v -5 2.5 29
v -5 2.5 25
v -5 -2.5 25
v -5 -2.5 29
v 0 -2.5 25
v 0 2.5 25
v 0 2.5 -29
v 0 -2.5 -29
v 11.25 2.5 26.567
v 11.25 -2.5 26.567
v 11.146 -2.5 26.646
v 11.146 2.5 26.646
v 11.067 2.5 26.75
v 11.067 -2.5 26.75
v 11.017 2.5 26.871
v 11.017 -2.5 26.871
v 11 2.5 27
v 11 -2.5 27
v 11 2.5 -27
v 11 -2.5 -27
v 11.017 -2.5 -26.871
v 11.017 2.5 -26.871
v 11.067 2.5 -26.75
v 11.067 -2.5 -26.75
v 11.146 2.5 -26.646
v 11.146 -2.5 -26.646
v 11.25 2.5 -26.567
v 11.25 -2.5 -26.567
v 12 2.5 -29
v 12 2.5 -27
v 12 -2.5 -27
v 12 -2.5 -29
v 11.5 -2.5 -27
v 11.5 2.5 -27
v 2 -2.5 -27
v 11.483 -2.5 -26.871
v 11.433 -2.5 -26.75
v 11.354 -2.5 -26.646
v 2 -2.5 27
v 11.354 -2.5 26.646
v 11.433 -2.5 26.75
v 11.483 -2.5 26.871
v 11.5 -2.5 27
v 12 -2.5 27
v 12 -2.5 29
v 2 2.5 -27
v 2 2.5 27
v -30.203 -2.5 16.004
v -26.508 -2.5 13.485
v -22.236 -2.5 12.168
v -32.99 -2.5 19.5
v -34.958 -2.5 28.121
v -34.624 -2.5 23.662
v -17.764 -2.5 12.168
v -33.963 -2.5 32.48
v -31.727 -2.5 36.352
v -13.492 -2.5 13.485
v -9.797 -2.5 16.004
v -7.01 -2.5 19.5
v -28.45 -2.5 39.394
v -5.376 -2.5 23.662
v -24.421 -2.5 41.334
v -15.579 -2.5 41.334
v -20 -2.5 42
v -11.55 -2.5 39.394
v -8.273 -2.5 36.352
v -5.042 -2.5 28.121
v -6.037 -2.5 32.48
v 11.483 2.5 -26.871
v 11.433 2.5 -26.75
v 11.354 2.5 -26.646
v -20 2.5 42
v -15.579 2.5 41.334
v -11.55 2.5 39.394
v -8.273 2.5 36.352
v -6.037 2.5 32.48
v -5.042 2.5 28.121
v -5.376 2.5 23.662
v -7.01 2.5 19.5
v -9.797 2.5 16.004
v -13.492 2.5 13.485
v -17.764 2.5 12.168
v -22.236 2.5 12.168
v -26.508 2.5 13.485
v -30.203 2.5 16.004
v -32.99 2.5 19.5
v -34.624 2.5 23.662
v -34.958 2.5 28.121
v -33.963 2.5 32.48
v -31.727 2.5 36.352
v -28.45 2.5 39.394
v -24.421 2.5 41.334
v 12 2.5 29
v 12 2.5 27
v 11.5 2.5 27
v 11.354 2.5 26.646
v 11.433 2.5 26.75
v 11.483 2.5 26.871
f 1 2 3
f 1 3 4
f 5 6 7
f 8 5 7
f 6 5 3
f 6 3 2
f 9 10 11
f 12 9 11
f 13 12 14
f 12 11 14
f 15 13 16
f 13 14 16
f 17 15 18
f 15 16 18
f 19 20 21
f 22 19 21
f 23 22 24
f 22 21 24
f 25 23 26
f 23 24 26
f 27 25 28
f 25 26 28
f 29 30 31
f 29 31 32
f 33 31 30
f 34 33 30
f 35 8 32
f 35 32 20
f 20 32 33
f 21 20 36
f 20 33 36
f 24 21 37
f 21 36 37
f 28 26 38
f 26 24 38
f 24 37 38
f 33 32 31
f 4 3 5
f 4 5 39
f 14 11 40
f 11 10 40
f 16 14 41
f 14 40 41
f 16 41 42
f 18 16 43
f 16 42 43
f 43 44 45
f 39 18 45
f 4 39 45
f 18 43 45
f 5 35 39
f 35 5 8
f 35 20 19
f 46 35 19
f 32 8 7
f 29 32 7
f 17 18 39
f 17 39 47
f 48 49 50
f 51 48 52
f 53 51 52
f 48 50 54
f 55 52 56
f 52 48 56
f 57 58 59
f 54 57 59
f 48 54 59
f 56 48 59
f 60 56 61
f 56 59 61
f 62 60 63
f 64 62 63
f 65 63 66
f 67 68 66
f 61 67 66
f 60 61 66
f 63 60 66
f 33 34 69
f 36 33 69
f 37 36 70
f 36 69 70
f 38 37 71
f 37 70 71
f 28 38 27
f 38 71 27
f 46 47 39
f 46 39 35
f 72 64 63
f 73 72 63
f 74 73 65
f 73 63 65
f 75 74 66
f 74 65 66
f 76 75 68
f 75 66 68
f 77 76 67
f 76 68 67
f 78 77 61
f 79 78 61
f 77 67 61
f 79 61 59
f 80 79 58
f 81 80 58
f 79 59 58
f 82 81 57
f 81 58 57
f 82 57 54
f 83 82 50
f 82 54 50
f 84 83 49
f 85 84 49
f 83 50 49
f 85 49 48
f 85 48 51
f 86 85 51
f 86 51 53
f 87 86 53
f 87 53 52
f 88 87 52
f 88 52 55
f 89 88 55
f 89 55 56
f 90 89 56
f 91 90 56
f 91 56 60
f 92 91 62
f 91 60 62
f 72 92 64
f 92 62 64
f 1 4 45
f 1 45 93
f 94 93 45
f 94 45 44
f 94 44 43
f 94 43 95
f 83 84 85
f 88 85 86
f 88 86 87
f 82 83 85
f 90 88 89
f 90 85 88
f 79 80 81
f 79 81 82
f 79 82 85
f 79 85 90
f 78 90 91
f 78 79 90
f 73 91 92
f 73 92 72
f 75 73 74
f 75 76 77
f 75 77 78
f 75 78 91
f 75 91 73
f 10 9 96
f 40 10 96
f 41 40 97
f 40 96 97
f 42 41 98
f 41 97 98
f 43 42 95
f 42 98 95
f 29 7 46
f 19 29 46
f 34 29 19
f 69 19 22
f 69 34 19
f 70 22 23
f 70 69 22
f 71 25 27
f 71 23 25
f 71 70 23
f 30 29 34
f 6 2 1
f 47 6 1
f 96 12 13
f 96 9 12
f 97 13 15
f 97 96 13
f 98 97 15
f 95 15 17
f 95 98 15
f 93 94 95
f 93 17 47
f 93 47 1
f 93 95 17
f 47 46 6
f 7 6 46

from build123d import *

# Parameters (mm, degrees)
SKETCH6_W                = 58
SKETCH6_H                = 5
BOSS_EXTRUDE2_DEPTH      = 12
SKETCH7_W                = 54
SKETCH7_H                = 5
CUT_EXTRUDE3_DEPTH       = 10
SKETCH8_W                = 0.5
SKETCH8_H                = 5
BOSS_EXTRUDE3_DEPTH      = 0.5
FILLET1_R                = 0.5
FILLET1_OF_MIRROR3_R     = 0.5
SKETCH9_W                = 4
SKETCH9_H                = 5
BOSS_EXTRUDE4_DEPTH      = 5
BOSS_EXTRUDE5_DEPTH      = 2.5
BOSS_EXTRUDE5_DEPTH_BACK = 2.5
SKETCH11_R               = 15


with BuildPart() as part:
    # Sketch6 → Boss-Extrude2 (new body)
    with BuildSketch(Plane(origin=(0, 0, 0), x_dir=(0, 0, -1), z_dir=(1, 0, 0))):
        Rectangle(SKETCH6_W, SKETCH6_H)
    extrude(amount=BOSS_EXTRUDE2_DEPTH)

    # Sketch7 → Cut-Extrude3 (cut)
    with BuildSketch(Plane(origin=(12, 0, 0), x_dir=(0, 0, -1), z_dir=(1, 0, 0))):
        Rectangle(SKETCH7_W, SKETCH7_H)
    extrude(amount=-CUT_EXTRUDE3_DEPTH, mode=Mode.SUBTRACT)

    # Sketch8 → Boss-Extrude3 (add)
    with BuildSketch(Plane.XY.offset(-27)):
        with Locations((11.25, 0)):
            Rectangle(SKETCH8_W, SKETCH8_H)
    boss_extrude3 = extrude(amount=BOSS_EXTRUDE3_DEPTH)

    # Fillet1
    # the kernel refuses this fillet: 0.5 mm, written as the material it takes off along each edge
    with BuildSketch(Plane(origin=(11, -3.75, -26.5), x_dir=(0, 0, -1), z_dir=(0, 1, 0)), Plane(origin=(11.5, 3.75, -26.5), x_dir=(0, 0, -1), z_dir=(0, -1, 0))) as fillet1_piece_1:
        with BuildLine():
            CenterArc((FILLET1_R, -FILLET1_R), FILLET1_R, 90, 90)
            Line((0, -FILLET1_R), (0, 0))
            Line((0, 0), (FILLET1_R, 0))
        make_face()
    extrude(amount=7.5, mode=Mode.SUBTRACT)

    # Mirror3: Boss-Extrude3 across plane
    add(boss_extrude3.mirror(Plane(origin=(0, 0, 0), x_dir=(1, 0, 0), z_dir=(0, 0, -1))))

    # Fillet1 of Mirror3
    # the kernel refuses this fillet: 0.5 mm, written as the material it takes off along each edge
    with BuildSketch(Plane(origin=(11, -3.75, 26.5), x_dir=(0, 0, 1), z_dir=(0, 1, 0)), Plane(origin=(11.5, 3.75, 26.5), x_dir=(0, 0, 1), z_dir=(0, -1, 0))) as fillet1_of_mirror3_piece_1:
        with BuildLine():
            CenterArc((FILLET1_OF_MIRROR3_R, FILLET1_OF_MIRROR3_R), FILLET1_OF_MIRROR3_R, 180, 90)
            Line((0, FILLET1_OF_MIRROR3_R), (0, 0))
            Line((0, 0), (FILLET1_OF_MIRROR3_R, 0))
        make_face()
    extrude(amount=7.5, mode=Mode.SUBTRACT)

    # Sketch9 → Boss-Extrude4 (add)
    with BuildSketch(Plane.ZY):
        with Locations((27, 0)):
            Rectangle(SKETCH9_W, SKETCH9_H)
    extrude(amount=BOSS_EXTRUDE4_DEPTH)


with BuildPart() as body_2:
    # Sketch11 → Boss-Extrude5 (new, two sides: drawn at the far end of the back side and taken through both)
    with BuildSketch(Plane(origin=(0, 0, 0), x_dir=(1, 0, 0), z_dir=(0, 1, 0)).offset(-BOSS_EXTRUDE5_DEPTH_BACK)):
        with Locations(Location((-20, -27, 0), (0, 0, 270))):
            Circle(SKETCH11_R)
    extrude(amount=BOSS_EXTRUDE5_DEPTH + BOSS_EXTRUDE5_DEPTH_BACK)


solid = Compound([part.part, body_2.part])
